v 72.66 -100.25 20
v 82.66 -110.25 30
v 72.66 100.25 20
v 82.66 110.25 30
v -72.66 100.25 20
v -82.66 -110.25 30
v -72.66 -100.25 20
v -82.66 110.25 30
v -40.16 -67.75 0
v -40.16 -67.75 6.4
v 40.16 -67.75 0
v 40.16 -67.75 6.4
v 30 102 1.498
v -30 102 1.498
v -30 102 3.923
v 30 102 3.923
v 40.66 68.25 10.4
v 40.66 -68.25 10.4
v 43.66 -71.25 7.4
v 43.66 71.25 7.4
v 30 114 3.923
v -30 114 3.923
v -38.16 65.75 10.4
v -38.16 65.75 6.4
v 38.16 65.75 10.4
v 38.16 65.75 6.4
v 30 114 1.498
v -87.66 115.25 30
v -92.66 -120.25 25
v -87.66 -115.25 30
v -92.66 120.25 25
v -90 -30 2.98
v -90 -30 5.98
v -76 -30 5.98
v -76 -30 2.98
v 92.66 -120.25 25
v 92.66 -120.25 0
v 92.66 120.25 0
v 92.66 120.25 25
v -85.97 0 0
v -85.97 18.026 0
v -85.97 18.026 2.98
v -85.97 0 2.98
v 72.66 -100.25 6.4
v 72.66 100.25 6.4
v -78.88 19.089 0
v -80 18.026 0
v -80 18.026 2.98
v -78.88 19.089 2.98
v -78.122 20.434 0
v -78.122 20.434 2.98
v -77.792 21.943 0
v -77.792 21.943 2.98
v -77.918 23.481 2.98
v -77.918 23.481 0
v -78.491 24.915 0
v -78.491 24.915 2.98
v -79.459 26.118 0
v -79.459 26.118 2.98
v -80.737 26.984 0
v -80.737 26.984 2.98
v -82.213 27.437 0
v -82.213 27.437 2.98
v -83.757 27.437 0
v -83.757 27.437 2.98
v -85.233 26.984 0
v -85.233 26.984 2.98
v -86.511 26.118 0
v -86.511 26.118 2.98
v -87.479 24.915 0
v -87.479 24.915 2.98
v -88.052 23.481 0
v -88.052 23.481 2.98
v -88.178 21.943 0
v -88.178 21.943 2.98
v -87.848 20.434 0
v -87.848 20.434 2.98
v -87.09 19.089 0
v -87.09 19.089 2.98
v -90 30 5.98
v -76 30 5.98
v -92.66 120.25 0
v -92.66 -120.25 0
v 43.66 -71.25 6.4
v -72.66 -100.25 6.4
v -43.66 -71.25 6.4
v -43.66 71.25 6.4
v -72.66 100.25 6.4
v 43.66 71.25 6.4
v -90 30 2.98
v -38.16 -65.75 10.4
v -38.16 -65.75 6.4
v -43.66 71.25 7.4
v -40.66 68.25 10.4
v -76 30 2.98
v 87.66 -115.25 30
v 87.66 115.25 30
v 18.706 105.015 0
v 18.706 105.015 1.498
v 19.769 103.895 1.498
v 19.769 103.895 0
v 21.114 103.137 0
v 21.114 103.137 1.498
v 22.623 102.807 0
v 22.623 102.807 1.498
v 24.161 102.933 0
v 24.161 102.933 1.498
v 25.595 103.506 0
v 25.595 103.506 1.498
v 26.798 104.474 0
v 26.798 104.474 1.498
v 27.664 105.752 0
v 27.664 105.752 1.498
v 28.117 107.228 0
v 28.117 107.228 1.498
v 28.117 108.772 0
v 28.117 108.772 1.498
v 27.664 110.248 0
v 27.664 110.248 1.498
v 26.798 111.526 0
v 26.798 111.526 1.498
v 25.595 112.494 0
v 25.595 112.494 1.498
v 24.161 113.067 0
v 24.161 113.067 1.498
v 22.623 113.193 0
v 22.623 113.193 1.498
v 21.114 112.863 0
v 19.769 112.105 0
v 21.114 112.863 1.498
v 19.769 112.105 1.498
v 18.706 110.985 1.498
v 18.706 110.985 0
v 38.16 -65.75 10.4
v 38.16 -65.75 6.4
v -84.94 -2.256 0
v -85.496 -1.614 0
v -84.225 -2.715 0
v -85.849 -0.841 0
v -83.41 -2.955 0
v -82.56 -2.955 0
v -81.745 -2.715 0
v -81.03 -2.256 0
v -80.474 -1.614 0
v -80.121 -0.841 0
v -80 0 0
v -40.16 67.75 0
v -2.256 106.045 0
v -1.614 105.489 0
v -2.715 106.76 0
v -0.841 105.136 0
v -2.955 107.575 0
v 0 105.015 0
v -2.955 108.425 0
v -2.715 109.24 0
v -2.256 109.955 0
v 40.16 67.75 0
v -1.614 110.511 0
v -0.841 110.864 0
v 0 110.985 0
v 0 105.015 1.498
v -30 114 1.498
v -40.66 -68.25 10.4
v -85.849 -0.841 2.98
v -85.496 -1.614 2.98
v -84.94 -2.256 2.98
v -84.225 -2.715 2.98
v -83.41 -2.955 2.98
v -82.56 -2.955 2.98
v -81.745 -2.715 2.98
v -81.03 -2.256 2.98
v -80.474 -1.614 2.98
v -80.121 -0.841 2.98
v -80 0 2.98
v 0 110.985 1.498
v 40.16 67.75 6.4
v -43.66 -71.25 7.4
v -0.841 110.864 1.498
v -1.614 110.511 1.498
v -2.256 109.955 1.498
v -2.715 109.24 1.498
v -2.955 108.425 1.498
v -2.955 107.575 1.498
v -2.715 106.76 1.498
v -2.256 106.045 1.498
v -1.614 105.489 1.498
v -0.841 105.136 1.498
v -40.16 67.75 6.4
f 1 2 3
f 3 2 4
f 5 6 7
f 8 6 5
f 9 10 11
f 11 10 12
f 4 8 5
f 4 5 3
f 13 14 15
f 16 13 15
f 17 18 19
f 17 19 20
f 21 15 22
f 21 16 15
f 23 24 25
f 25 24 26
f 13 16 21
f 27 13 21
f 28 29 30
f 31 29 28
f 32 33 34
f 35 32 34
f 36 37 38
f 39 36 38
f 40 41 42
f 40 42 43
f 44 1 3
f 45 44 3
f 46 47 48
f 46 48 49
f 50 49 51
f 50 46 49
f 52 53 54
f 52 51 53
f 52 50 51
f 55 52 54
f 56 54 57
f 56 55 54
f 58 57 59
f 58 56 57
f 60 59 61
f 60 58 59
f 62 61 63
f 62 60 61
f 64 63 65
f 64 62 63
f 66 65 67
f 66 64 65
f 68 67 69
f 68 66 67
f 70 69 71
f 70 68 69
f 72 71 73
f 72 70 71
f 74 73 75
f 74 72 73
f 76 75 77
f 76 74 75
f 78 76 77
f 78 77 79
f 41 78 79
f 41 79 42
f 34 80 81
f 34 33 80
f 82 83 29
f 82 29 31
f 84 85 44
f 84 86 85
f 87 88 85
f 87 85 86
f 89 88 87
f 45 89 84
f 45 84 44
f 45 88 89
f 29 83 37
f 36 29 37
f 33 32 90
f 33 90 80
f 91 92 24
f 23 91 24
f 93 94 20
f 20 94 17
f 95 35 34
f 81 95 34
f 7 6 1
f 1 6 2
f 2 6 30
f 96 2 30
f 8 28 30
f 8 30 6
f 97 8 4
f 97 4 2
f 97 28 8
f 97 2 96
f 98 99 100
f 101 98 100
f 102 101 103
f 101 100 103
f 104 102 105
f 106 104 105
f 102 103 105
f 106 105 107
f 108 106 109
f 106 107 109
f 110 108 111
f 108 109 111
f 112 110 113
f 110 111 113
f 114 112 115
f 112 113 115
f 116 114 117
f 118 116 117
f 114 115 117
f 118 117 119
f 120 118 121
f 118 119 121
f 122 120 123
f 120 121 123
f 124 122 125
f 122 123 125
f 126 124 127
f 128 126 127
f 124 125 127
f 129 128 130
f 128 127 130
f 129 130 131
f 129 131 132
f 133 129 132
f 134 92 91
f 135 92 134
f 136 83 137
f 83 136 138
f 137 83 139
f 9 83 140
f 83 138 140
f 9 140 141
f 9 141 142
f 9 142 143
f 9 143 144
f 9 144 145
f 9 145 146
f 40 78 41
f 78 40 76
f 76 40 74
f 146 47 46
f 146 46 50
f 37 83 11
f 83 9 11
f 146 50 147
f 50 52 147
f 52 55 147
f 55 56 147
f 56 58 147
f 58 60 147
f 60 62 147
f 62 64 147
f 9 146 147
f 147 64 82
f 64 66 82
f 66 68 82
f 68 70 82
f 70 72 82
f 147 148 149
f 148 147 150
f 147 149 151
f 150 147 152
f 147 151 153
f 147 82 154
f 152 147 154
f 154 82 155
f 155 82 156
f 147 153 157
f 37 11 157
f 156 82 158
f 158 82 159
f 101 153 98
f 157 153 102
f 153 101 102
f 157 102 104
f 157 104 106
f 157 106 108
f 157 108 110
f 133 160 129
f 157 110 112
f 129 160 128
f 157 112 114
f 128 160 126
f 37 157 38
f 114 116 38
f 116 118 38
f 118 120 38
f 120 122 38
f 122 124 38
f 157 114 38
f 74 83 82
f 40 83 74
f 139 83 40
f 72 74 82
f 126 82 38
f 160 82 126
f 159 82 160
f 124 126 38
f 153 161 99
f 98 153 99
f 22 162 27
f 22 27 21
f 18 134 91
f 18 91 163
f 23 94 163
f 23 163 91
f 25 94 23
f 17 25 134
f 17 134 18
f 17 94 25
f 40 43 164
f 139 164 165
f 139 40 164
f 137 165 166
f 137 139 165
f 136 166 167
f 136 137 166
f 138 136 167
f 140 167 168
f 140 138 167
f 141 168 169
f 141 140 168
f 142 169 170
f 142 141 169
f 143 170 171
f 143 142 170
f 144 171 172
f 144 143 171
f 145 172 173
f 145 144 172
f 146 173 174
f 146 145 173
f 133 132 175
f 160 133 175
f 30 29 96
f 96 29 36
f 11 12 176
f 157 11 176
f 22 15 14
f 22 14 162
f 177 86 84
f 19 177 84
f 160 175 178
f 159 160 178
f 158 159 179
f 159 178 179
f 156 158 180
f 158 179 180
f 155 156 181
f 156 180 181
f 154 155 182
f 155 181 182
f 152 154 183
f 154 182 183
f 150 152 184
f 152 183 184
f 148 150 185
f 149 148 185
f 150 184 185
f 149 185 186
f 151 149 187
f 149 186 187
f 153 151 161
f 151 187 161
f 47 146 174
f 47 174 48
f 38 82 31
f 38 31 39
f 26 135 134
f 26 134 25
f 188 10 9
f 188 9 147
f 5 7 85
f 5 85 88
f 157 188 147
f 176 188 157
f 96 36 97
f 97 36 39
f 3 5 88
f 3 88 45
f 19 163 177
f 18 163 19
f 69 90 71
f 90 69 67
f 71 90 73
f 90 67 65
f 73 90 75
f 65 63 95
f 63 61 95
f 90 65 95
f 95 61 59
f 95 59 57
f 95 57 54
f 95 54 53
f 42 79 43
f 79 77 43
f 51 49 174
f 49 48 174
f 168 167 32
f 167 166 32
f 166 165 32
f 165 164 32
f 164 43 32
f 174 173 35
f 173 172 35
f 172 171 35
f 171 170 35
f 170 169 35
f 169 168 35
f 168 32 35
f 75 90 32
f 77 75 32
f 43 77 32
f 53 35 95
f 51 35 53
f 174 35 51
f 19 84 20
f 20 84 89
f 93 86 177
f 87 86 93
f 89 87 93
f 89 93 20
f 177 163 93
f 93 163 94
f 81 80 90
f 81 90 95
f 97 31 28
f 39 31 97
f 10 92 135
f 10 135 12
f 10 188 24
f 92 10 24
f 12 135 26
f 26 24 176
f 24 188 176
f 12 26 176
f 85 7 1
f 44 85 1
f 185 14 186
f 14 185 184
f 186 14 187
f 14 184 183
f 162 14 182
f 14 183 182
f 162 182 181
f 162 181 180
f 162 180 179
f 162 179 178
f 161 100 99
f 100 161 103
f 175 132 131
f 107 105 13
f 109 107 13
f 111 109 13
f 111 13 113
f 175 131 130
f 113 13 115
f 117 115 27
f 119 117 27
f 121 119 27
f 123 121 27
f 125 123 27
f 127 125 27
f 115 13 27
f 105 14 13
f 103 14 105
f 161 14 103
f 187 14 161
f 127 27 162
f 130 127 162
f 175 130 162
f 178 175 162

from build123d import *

# Parameters (mm, degrees)
SKETCH_W             = 185.32
SKETCH_H             = 240.5
PAD_DEPTH            = 30
SKETCH003_W          = 145.32
SKETCH003_H          = 200.5
POCKET_DEPTH         = 23.6
SKETCH004_W          = 80.32
SKETCH004_H          = 135.5
POCKET001_DEPTH      = 6.4
POCKET002_DEPTH      = 3
SKETCH006_W          = 14
SKETCH006_H          = 3
POCKET003_DEPTH      = 30
POCKET004_DEPTH      = 1.5
SKETCH008_W          = 12
SKETCH008_H          = 2.4244
POCKET005_DEPTH      = 30
SKETCH009_W          = 87.32
SKETCH009_H          = 142.5
PAD001_DEPTH         = 4
SKETCH010_W          = 76.32
SKETCH010_H          = 131.5
POCKET006_DEPTH      = 0.001
POCKET006_DEPTH_BACK = -30.001
CHAMFER_SIZE         = 10
CHAMFER001_SIZE      = 5
CHAMFER002_SIZE      = 3


with BuildPart() as part:
    # Sketch → Pad (new body)
    with BuildSketch(Plane.XY):
        Rectangle(SKETCH_W, SKETCH_H)
    extrude(amount=PAD_DEPTH)

    # Sketch003 → Pocket (cut)
    with BuildSketch(Plane.XY.offset(30)):
        Rectangle(SKETCH003_W, SKETCH003_H)
    extrude(amount=-POCKET_DEPTH, mode=Mode.SUBTRACT)

    # Sketch004 → Pocket001 (cut)
    with BuildSketch(Plane.XY.offset(6.4)):
        Rectangle(SKETCH004_W, SKETCH004_H)
    extrude(amount=-POCKET001_DEPTH, mode=Mode.SUBTRACT)

    # Sketch005 → Pocket002 (cut)
    with BuildSketch(Plane.XY):
        with BuildLine():
            ThreePointArc((-85.97, 0), (-82.985, -2.985), (-80, 0))
            Line((-80, 0), (-80, 18.025988))
            ThreePointArc((-80, 18.025988), (-82.985, 27.495), (-85.97, 18.025988))
            Line((-85.97, 18.025988), (-85.97, 0))
        make_face()
    extrude(amount=POCKET002_DEPTH, mode=Mode.SUBTRACT)

    # Sketch006 → Pocket003 (cut, symmetric)
    with BuildSketch(Plane.XZ):
        with Locations((-83, 4.48)):
            Rectangle(SKETCH006_W, SKETCH006_H)
    extrude(amount=POCKET003_DEPTH, both=True, mode=Mode.SUBTRACT)

    # Sketch007 → Pocket004 (cut, symmetric)
    with BuildSketch(Plane.XY):
        with BuildLine():
            ThreePointArc((0, 110.985), (-2.985, 108), (0, 105.015))
            Line((0, 105.015), (18.705988, 105.015))
            ThreePointArc((18.705988, 105.015), (28.175, 108), (18.705988, 110.985))
            Line((18.705988, 110.985), (0, 110.985))
        make_face()
    extrude(amount=POCKET004_DEPTH, both=True, mode=Mode.SUBTRACT)

    # Sketch008 → Pocket005 (cut, symmetric)
    with BuildSketch(Plane.YZ):
        with Locations((108, 2.7105)):
            Rectangle(SKETCH008_W, SKETCH008_H)
    extrude(amount=POCKET005_DEPTH, both=True, mode=Mode.SUBTRACT)

    # Sketch009 → Pad001 (join)
    with BuildSketch(Plane.XY.offset(6.4)):
        Rectangle(SKETCH009_W, SKETCH009_H)
    extrude(amount=PAD001_DEPTH)

    # Sketch010 → Pocket006 (cut, two sides)
    with BuildSketch(Plane.XY) as pocket006_sk:
        Rectangle(SKETCH010_W, SKETCH010_H)
    extrude(amount=-POCKET006_DEPTH, mode=Mode.SUBTRACT)
    extrude(pocket006_sk.sketch, amount=-POCKET006_DEPTH_BACK, mode=Mode.SUBTRACT)

    # Chamfer
    chamfer_edges = [part.edges().sort_by_distance(p)[0] for p in [
        (-72.66, 0, 30),
        (0, 100.25, 30),
        (72.66, 0, 30),
        (0, -100.25, 30),
    ]]
    chamfer(chamfer_edges, length=CHAMFER_SIZE)

    # Chamfer001
    chamfer001_edges = [part.edges().sort_by_distance(p)[0] for p in [
        (0, 120.25, 30),
        (-92.66, 0, 30),
        (0, -120.25, 30),
        (92.66, 0, 30),
    ]]
    chamfer(chamfer001_edges, length=CHAMFER001_SIZE)

    # Chamfer002
    chamfer002_edges = [part.edges().sort_by_distance(p)[0] for p in [
        (-43.66, 0, 10.4),
        (0, -71.25, 10.4),
        (43.66, 0, 10.4),
        (0, 71.25, 10.4),
    ]]
    chamfer(chamfer002_edges, length=CHAMFER002_SIZE)


solid = part.part
